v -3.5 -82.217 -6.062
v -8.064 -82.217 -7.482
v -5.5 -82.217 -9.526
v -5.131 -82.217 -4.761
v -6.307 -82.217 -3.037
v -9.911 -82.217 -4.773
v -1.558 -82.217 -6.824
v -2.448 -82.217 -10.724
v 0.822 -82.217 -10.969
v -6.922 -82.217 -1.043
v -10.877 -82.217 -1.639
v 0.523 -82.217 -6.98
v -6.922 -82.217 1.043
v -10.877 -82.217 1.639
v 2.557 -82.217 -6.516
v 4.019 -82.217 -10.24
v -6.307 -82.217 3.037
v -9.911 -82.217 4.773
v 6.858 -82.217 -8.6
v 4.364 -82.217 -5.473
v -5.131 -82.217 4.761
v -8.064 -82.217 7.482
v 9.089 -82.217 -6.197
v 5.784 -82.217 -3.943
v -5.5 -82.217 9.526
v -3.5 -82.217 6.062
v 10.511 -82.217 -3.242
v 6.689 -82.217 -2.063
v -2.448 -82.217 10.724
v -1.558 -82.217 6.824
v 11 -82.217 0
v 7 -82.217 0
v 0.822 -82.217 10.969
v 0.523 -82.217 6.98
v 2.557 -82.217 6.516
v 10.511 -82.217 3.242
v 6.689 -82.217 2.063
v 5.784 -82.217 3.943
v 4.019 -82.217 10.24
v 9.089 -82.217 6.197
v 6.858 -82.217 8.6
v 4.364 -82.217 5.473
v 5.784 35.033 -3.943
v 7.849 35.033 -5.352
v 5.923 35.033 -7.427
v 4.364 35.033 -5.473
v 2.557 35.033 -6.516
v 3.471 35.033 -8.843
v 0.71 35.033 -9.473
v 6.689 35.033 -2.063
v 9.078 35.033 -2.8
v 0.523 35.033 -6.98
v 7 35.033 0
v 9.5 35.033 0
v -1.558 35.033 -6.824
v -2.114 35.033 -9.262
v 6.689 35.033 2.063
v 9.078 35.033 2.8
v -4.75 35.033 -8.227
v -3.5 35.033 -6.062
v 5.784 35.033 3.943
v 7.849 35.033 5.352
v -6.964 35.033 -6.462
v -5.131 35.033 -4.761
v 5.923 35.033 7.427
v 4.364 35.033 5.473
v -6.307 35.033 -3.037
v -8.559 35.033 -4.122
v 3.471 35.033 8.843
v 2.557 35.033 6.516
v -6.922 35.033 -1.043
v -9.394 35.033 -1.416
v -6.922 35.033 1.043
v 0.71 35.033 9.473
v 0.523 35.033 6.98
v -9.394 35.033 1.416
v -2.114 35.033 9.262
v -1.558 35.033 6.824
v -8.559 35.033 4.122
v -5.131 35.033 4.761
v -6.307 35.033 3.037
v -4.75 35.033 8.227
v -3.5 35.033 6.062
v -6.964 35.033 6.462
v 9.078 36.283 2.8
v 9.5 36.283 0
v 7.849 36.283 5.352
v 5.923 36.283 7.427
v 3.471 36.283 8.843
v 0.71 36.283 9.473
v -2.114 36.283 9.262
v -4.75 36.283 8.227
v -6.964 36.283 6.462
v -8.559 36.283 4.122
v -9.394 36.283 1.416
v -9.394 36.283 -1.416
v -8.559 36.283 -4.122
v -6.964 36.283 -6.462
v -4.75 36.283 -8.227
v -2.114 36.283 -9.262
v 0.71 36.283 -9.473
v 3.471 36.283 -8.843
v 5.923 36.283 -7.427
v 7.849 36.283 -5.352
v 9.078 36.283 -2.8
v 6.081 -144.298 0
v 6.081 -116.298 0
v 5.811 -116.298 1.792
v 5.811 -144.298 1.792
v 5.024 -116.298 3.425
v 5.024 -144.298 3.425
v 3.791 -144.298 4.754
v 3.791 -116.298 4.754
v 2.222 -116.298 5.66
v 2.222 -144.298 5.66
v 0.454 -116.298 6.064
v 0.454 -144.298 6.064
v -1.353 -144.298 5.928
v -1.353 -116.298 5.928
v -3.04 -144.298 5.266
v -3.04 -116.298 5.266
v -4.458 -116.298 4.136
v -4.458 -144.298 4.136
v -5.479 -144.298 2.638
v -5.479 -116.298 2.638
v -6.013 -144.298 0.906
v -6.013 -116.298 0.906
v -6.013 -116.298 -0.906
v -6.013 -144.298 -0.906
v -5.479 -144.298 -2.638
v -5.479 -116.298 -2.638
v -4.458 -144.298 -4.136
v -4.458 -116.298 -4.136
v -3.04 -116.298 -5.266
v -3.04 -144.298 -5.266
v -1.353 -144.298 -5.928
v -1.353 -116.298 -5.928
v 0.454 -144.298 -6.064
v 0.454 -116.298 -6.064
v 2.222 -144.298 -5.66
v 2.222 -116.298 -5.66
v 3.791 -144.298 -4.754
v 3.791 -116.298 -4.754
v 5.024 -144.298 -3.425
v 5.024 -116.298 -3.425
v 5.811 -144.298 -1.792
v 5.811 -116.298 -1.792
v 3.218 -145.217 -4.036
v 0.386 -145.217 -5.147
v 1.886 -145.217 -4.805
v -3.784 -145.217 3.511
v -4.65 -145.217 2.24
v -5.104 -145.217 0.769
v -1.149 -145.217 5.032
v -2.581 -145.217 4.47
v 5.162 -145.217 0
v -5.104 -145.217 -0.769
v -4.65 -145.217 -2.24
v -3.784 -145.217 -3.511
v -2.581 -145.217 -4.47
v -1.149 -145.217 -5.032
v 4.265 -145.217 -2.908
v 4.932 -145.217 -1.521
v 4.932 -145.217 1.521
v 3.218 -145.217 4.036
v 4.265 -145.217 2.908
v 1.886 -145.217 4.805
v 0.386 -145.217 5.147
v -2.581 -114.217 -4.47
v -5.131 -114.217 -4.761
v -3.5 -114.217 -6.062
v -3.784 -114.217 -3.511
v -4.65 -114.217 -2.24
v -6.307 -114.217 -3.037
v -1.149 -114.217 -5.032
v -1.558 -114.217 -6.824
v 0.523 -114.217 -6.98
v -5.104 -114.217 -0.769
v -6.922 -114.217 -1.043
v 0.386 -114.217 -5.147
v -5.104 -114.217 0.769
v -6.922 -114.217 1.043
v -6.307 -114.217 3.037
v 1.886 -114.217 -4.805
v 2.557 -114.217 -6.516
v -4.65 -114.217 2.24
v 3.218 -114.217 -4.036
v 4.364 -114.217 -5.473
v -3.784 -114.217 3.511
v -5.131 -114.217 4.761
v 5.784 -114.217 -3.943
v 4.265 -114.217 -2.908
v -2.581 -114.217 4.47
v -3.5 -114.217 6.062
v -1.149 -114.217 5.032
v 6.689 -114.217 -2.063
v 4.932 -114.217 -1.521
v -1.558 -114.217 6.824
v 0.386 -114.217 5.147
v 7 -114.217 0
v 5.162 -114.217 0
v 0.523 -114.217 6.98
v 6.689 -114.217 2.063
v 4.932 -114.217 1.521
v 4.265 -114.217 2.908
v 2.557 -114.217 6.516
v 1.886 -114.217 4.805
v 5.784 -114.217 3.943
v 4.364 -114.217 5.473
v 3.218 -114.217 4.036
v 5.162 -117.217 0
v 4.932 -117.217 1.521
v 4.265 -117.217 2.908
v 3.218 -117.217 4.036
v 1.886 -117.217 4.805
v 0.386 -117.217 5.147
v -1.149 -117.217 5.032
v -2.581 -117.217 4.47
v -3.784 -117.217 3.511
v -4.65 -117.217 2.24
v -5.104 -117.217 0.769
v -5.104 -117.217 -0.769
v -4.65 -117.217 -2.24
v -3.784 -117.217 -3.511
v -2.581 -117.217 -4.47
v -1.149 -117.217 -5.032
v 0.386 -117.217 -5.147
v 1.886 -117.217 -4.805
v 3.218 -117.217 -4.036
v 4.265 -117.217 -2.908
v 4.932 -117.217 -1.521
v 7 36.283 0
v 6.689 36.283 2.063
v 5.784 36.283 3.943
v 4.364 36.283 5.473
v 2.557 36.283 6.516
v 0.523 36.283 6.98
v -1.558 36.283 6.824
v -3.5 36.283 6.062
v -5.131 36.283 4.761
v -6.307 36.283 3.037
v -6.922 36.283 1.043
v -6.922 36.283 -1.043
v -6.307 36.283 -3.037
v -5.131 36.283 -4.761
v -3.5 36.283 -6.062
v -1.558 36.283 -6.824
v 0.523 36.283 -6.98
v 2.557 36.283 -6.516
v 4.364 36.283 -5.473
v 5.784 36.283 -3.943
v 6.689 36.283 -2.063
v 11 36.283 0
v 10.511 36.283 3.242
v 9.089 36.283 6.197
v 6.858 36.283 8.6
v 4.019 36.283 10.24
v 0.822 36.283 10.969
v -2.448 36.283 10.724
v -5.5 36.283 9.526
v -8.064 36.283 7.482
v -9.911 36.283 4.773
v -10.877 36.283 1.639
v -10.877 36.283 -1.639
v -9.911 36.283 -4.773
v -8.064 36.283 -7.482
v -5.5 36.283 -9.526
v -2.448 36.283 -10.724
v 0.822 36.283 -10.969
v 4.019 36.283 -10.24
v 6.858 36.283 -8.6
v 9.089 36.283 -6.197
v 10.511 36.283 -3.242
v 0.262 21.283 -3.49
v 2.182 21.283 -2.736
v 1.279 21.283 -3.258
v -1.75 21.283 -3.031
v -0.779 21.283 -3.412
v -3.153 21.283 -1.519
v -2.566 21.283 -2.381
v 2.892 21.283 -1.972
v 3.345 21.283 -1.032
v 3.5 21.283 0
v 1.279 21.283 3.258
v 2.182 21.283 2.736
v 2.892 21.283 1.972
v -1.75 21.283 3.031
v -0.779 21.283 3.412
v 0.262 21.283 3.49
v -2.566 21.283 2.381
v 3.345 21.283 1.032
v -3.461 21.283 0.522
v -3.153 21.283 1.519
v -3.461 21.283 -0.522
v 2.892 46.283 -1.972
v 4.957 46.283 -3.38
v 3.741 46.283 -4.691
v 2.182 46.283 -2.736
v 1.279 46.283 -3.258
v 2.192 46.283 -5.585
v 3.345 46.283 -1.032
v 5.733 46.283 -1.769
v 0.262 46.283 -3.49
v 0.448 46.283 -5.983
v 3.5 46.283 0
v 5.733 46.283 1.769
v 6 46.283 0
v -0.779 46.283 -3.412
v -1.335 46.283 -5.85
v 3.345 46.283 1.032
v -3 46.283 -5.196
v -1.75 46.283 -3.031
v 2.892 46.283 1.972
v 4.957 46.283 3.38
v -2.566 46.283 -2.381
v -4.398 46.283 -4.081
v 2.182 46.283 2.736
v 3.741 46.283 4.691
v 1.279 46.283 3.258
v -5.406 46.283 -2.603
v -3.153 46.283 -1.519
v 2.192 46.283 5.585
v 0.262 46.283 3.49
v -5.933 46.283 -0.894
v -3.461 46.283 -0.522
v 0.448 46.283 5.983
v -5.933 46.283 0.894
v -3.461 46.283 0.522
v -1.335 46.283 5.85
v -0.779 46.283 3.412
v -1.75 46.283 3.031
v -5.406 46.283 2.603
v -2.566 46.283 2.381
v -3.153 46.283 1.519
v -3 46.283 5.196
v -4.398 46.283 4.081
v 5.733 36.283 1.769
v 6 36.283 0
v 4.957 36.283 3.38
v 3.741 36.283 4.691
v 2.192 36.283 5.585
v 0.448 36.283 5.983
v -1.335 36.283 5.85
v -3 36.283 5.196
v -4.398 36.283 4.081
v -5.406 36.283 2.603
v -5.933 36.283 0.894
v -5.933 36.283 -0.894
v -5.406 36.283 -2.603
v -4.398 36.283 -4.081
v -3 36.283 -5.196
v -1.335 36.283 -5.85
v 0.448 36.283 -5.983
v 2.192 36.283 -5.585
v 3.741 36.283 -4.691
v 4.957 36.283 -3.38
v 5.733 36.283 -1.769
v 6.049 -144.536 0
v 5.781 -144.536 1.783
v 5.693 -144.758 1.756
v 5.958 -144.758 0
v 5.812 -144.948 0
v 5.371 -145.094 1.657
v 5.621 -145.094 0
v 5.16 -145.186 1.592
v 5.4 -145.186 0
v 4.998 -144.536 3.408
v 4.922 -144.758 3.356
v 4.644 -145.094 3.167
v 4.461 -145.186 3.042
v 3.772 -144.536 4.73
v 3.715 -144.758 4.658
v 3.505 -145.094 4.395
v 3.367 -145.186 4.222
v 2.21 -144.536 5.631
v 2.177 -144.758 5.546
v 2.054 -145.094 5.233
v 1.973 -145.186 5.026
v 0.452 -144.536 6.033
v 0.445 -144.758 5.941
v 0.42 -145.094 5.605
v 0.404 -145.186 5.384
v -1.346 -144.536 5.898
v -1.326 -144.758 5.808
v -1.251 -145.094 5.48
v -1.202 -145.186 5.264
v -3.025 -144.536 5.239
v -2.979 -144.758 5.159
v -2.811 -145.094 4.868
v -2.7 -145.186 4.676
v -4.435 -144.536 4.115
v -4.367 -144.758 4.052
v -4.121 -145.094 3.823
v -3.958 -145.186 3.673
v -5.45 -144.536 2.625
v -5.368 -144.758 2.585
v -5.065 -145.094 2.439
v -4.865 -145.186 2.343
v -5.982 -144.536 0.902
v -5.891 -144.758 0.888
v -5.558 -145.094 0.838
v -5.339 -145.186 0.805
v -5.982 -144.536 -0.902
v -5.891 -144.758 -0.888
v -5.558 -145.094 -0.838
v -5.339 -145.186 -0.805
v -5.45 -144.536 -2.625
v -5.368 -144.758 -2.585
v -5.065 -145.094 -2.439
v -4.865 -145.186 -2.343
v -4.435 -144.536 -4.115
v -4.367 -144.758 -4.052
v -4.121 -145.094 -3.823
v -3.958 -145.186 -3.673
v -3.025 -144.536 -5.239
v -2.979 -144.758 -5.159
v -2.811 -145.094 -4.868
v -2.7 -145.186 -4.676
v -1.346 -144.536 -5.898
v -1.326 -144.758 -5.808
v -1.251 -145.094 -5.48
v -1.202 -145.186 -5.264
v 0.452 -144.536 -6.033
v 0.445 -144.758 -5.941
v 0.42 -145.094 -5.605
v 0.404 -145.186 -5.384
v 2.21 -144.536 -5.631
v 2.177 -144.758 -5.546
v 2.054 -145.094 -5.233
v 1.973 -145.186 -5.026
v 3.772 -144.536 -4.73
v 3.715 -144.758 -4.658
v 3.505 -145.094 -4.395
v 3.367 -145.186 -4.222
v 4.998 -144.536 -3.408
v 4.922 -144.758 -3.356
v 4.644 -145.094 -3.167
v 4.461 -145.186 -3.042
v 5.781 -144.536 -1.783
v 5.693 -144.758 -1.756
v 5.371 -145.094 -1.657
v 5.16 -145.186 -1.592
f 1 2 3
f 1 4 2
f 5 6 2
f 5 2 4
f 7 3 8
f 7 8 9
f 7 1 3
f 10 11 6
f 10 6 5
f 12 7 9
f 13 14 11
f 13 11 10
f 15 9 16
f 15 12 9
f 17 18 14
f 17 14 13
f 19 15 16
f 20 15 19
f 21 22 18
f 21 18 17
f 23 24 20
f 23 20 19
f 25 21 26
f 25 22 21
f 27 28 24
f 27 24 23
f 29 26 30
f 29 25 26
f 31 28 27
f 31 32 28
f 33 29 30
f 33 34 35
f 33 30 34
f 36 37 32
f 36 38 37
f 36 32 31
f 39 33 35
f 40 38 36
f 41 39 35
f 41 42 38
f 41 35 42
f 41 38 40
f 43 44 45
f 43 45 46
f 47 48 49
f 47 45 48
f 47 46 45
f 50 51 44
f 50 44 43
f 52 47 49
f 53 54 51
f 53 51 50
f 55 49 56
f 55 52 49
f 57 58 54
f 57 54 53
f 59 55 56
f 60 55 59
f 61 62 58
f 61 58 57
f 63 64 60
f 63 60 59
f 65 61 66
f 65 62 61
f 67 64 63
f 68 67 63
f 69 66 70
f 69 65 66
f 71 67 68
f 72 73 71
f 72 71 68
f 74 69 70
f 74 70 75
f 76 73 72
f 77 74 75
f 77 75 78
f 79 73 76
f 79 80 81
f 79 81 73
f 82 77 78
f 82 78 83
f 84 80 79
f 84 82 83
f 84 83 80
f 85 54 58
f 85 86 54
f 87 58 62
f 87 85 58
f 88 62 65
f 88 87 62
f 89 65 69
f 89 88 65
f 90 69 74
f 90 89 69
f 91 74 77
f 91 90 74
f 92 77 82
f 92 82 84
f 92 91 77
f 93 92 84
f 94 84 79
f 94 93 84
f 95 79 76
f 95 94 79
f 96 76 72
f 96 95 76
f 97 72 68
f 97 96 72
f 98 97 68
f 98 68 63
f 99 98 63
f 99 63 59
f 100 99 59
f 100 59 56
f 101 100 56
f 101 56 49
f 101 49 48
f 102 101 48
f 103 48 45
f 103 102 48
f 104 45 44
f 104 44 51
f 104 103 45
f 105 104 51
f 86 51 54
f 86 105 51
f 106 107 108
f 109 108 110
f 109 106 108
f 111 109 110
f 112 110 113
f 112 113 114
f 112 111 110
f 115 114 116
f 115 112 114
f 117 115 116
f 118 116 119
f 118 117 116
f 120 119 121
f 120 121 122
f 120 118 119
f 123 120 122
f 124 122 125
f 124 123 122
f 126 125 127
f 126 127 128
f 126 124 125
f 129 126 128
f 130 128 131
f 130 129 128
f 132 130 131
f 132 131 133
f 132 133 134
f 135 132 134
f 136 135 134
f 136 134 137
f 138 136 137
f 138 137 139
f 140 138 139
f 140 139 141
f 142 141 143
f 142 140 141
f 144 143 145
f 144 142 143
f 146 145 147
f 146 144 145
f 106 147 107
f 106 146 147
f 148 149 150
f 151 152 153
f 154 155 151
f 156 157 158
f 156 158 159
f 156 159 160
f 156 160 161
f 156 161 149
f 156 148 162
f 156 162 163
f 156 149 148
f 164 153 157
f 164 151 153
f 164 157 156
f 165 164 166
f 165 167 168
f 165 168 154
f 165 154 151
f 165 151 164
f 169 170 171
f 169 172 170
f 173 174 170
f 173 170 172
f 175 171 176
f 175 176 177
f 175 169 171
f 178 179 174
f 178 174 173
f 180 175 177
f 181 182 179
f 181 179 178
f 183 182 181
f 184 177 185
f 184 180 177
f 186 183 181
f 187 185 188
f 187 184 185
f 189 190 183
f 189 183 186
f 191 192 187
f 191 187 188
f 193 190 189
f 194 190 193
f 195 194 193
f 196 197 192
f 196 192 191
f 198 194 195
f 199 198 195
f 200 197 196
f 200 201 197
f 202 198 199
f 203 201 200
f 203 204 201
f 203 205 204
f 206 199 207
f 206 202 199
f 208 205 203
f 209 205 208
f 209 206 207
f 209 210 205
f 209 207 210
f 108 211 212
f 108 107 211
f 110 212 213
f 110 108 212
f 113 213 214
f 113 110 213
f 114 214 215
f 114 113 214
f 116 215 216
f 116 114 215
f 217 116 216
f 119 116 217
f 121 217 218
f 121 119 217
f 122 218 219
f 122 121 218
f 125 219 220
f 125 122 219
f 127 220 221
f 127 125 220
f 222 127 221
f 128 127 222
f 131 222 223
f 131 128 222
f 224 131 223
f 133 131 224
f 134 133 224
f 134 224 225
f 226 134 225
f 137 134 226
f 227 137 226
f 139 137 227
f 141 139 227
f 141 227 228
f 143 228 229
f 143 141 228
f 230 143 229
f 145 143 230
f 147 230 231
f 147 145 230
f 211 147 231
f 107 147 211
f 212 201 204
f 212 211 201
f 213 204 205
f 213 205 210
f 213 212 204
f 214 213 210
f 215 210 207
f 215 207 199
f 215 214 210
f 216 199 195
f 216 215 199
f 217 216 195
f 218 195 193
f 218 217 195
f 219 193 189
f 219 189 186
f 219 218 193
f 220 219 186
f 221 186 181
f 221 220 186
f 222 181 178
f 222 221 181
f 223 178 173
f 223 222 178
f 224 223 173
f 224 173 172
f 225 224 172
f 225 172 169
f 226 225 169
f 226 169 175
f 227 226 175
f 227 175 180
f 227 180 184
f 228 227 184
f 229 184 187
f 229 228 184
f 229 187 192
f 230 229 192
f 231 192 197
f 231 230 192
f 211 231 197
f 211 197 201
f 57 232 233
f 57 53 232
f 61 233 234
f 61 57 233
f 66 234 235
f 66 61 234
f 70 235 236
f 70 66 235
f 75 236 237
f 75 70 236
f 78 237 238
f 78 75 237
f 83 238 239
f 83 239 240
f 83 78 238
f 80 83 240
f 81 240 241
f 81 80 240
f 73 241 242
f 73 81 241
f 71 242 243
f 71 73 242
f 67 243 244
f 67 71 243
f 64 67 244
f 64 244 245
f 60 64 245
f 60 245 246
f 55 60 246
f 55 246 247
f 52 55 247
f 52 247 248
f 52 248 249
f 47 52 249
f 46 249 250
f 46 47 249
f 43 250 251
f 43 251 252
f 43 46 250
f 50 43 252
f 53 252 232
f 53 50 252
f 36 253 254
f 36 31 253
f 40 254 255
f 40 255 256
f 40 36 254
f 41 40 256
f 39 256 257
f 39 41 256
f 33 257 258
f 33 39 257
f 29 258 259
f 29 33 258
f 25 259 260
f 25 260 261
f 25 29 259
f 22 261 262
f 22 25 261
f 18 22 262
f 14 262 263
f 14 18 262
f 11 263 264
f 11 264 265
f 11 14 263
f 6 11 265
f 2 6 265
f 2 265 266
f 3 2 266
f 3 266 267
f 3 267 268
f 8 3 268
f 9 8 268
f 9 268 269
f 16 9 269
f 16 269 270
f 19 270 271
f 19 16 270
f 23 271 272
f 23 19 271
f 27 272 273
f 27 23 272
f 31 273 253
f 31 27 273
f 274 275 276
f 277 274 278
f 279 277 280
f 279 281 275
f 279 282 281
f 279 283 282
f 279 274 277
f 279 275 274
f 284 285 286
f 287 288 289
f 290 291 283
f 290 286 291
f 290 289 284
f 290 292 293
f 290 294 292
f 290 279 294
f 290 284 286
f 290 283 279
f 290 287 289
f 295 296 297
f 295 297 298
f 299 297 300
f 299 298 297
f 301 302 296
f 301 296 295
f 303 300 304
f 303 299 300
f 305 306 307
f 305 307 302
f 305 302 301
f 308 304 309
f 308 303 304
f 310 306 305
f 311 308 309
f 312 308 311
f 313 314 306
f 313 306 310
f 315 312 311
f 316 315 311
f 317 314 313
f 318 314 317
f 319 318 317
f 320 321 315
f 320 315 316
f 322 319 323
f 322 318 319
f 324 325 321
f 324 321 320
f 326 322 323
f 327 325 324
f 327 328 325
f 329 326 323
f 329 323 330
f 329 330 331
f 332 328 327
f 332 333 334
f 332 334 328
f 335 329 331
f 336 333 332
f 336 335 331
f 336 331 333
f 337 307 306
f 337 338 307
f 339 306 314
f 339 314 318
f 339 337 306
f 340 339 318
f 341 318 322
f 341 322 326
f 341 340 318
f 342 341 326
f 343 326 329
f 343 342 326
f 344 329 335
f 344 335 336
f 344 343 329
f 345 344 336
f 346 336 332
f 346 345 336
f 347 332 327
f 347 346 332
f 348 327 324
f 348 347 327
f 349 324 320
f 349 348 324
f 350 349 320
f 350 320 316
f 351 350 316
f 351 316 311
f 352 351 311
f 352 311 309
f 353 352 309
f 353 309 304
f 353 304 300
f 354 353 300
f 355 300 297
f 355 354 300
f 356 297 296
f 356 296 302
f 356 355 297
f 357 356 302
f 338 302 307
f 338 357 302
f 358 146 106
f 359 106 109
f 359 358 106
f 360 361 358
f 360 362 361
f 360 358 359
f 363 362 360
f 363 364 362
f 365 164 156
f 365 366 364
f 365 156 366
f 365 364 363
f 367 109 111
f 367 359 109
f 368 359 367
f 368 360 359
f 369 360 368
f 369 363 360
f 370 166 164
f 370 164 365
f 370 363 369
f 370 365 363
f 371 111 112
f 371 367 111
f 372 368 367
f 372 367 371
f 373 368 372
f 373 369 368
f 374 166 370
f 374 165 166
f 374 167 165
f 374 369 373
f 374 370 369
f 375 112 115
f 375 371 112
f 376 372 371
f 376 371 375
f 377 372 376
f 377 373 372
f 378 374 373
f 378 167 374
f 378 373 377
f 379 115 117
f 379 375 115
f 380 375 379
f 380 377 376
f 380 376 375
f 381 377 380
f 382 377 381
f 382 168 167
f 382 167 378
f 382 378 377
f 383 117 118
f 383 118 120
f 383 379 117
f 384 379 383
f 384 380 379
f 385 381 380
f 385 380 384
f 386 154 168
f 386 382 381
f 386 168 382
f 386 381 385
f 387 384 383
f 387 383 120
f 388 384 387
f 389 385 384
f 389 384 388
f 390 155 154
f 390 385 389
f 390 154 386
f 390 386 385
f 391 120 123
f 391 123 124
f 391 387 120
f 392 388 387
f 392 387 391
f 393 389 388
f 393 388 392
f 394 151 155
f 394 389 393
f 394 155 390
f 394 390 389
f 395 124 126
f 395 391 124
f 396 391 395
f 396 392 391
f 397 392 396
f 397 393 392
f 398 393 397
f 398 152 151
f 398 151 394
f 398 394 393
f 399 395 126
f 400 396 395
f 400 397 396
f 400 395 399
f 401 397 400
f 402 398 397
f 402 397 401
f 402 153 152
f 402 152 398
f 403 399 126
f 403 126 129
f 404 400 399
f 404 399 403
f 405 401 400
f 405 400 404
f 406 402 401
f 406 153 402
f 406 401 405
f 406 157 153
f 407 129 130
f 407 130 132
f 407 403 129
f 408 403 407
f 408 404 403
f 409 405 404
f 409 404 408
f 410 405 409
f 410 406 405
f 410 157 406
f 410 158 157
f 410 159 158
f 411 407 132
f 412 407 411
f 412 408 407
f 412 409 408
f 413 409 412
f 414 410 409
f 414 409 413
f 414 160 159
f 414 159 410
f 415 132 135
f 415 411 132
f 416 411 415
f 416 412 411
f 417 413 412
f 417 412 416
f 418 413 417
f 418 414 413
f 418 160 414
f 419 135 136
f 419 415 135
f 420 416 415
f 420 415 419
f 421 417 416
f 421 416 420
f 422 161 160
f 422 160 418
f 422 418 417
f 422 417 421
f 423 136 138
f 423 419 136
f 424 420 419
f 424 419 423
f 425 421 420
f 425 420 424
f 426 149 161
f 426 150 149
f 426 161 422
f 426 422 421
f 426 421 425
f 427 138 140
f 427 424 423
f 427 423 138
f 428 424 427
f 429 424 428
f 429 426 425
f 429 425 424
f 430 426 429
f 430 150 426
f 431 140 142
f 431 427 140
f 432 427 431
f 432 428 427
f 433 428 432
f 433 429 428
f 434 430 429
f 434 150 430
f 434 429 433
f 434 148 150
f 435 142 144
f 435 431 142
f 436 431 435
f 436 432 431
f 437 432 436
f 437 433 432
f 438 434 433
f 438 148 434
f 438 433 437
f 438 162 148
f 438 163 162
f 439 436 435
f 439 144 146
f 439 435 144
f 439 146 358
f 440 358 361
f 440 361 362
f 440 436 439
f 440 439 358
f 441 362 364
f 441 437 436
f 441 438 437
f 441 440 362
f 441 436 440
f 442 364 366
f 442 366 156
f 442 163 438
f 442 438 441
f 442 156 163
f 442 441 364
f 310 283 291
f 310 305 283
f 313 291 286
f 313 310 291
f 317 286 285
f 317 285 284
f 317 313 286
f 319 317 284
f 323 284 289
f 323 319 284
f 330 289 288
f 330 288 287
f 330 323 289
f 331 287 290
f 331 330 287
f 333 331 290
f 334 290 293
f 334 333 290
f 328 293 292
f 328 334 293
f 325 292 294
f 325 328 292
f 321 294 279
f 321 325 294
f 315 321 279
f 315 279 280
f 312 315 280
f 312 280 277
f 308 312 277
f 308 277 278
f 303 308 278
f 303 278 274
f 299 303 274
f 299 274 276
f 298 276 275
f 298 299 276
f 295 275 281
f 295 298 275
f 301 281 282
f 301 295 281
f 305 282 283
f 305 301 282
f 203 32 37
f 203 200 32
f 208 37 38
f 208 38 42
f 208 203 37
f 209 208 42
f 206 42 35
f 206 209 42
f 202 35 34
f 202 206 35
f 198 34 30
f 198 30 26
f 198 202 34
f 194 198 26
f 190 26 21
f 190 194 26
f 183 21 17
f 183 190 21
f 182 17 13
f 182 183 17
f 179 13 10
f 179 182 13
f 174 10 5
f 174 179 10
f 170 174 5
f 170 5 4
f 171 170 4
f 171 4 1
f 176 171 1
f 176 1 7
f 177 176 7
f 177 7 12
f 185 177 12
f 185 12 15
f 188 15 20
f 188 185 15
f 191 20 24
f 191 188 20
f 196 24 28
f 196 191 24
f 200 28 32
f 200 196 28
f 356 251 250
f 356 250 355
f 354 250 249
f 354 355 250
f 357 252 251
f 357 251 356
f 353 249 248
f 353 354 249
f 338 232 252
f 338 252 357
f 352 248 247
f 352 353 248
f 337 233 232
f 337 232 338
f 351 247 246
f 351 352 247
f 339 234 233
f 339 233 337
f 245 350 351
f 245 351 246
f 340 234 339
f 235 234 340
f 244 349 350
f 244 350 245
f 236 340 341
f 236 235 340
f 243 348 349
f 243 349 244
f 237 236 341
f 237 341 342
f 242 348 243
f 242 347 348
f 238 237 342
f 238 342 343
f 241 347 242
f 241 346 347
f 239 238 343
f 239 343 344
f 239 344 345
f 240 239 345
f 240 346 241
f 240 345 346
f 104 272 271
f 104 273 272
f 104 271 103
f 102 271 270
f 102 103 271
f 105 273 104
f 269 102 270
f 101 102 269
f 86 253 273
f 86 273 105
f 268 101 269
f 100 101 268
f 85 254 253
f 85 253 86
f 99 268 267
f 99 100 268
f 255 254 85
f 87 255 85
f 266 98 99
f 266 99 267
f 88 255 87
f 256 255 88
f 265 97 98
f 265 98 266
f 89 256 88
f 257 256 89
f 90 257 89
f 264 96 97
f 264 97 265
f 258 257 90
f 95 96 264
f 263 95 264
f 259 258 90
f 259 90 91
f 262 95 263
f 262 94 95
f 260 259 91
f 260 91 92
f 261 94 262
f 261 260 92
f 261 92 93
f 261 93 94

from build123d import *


with BuildPart() as part:
    # Croquis1 → Revolución1 (revolve)
    with BuildSketch(Plane.XY):
        with BuildLine():
            Line((3.5, 46.282828283), (6, 46.282828283))
            Line((6, 46.282828283), (6, 36.282828283))
            Line((6, 36.282828283), (7, 36.282828283))
            Line((7, 36.282828283), (7, 35.032828283))
            Line((7, 35.032828283), (9.5, 35.032828283))
            Line((9.5, 35.032828283), (9.5, 36.282828283))
            Line((9.5, 36.282828283), (11, 36.282828283))
            Line((11, 36.282828283), (11, -82.217171717))
            Line((11, -82.217171717), (7, -82.217171717))
            Line((7, -82.217171717), (7, -114.217171717))
            Line((7, -114.217171717), (5.161616162, -114.217171717))
            Line((5.161616162, -114.217171717), (5.161616162, -117.217171717))
            Line((5.161616162, -117.217171717), (6.080808081, -116.297979798))
            Line((6.080808081, -116.297979798), (6.080808081, -144.297979798))
            ThreePointArc((6.080808081, -144.297979798), (5.811583001, -144.947946637), (5.161616162, -145.217171717))
            Line((5.161616162, -145.217171717), (0, -145.217171717))
            Line((0, -145.217171717), (0, 21.282828283))
            Line((0, 21.282828283), (3.5, 21.282828283))
            Line((3.5, 21.282828283), (3.5, 46.282828283))
        make_face()
    revolve(axis=Axis((0, 29.484848485, 0), (0, -1, 0)))


solid = part.part
